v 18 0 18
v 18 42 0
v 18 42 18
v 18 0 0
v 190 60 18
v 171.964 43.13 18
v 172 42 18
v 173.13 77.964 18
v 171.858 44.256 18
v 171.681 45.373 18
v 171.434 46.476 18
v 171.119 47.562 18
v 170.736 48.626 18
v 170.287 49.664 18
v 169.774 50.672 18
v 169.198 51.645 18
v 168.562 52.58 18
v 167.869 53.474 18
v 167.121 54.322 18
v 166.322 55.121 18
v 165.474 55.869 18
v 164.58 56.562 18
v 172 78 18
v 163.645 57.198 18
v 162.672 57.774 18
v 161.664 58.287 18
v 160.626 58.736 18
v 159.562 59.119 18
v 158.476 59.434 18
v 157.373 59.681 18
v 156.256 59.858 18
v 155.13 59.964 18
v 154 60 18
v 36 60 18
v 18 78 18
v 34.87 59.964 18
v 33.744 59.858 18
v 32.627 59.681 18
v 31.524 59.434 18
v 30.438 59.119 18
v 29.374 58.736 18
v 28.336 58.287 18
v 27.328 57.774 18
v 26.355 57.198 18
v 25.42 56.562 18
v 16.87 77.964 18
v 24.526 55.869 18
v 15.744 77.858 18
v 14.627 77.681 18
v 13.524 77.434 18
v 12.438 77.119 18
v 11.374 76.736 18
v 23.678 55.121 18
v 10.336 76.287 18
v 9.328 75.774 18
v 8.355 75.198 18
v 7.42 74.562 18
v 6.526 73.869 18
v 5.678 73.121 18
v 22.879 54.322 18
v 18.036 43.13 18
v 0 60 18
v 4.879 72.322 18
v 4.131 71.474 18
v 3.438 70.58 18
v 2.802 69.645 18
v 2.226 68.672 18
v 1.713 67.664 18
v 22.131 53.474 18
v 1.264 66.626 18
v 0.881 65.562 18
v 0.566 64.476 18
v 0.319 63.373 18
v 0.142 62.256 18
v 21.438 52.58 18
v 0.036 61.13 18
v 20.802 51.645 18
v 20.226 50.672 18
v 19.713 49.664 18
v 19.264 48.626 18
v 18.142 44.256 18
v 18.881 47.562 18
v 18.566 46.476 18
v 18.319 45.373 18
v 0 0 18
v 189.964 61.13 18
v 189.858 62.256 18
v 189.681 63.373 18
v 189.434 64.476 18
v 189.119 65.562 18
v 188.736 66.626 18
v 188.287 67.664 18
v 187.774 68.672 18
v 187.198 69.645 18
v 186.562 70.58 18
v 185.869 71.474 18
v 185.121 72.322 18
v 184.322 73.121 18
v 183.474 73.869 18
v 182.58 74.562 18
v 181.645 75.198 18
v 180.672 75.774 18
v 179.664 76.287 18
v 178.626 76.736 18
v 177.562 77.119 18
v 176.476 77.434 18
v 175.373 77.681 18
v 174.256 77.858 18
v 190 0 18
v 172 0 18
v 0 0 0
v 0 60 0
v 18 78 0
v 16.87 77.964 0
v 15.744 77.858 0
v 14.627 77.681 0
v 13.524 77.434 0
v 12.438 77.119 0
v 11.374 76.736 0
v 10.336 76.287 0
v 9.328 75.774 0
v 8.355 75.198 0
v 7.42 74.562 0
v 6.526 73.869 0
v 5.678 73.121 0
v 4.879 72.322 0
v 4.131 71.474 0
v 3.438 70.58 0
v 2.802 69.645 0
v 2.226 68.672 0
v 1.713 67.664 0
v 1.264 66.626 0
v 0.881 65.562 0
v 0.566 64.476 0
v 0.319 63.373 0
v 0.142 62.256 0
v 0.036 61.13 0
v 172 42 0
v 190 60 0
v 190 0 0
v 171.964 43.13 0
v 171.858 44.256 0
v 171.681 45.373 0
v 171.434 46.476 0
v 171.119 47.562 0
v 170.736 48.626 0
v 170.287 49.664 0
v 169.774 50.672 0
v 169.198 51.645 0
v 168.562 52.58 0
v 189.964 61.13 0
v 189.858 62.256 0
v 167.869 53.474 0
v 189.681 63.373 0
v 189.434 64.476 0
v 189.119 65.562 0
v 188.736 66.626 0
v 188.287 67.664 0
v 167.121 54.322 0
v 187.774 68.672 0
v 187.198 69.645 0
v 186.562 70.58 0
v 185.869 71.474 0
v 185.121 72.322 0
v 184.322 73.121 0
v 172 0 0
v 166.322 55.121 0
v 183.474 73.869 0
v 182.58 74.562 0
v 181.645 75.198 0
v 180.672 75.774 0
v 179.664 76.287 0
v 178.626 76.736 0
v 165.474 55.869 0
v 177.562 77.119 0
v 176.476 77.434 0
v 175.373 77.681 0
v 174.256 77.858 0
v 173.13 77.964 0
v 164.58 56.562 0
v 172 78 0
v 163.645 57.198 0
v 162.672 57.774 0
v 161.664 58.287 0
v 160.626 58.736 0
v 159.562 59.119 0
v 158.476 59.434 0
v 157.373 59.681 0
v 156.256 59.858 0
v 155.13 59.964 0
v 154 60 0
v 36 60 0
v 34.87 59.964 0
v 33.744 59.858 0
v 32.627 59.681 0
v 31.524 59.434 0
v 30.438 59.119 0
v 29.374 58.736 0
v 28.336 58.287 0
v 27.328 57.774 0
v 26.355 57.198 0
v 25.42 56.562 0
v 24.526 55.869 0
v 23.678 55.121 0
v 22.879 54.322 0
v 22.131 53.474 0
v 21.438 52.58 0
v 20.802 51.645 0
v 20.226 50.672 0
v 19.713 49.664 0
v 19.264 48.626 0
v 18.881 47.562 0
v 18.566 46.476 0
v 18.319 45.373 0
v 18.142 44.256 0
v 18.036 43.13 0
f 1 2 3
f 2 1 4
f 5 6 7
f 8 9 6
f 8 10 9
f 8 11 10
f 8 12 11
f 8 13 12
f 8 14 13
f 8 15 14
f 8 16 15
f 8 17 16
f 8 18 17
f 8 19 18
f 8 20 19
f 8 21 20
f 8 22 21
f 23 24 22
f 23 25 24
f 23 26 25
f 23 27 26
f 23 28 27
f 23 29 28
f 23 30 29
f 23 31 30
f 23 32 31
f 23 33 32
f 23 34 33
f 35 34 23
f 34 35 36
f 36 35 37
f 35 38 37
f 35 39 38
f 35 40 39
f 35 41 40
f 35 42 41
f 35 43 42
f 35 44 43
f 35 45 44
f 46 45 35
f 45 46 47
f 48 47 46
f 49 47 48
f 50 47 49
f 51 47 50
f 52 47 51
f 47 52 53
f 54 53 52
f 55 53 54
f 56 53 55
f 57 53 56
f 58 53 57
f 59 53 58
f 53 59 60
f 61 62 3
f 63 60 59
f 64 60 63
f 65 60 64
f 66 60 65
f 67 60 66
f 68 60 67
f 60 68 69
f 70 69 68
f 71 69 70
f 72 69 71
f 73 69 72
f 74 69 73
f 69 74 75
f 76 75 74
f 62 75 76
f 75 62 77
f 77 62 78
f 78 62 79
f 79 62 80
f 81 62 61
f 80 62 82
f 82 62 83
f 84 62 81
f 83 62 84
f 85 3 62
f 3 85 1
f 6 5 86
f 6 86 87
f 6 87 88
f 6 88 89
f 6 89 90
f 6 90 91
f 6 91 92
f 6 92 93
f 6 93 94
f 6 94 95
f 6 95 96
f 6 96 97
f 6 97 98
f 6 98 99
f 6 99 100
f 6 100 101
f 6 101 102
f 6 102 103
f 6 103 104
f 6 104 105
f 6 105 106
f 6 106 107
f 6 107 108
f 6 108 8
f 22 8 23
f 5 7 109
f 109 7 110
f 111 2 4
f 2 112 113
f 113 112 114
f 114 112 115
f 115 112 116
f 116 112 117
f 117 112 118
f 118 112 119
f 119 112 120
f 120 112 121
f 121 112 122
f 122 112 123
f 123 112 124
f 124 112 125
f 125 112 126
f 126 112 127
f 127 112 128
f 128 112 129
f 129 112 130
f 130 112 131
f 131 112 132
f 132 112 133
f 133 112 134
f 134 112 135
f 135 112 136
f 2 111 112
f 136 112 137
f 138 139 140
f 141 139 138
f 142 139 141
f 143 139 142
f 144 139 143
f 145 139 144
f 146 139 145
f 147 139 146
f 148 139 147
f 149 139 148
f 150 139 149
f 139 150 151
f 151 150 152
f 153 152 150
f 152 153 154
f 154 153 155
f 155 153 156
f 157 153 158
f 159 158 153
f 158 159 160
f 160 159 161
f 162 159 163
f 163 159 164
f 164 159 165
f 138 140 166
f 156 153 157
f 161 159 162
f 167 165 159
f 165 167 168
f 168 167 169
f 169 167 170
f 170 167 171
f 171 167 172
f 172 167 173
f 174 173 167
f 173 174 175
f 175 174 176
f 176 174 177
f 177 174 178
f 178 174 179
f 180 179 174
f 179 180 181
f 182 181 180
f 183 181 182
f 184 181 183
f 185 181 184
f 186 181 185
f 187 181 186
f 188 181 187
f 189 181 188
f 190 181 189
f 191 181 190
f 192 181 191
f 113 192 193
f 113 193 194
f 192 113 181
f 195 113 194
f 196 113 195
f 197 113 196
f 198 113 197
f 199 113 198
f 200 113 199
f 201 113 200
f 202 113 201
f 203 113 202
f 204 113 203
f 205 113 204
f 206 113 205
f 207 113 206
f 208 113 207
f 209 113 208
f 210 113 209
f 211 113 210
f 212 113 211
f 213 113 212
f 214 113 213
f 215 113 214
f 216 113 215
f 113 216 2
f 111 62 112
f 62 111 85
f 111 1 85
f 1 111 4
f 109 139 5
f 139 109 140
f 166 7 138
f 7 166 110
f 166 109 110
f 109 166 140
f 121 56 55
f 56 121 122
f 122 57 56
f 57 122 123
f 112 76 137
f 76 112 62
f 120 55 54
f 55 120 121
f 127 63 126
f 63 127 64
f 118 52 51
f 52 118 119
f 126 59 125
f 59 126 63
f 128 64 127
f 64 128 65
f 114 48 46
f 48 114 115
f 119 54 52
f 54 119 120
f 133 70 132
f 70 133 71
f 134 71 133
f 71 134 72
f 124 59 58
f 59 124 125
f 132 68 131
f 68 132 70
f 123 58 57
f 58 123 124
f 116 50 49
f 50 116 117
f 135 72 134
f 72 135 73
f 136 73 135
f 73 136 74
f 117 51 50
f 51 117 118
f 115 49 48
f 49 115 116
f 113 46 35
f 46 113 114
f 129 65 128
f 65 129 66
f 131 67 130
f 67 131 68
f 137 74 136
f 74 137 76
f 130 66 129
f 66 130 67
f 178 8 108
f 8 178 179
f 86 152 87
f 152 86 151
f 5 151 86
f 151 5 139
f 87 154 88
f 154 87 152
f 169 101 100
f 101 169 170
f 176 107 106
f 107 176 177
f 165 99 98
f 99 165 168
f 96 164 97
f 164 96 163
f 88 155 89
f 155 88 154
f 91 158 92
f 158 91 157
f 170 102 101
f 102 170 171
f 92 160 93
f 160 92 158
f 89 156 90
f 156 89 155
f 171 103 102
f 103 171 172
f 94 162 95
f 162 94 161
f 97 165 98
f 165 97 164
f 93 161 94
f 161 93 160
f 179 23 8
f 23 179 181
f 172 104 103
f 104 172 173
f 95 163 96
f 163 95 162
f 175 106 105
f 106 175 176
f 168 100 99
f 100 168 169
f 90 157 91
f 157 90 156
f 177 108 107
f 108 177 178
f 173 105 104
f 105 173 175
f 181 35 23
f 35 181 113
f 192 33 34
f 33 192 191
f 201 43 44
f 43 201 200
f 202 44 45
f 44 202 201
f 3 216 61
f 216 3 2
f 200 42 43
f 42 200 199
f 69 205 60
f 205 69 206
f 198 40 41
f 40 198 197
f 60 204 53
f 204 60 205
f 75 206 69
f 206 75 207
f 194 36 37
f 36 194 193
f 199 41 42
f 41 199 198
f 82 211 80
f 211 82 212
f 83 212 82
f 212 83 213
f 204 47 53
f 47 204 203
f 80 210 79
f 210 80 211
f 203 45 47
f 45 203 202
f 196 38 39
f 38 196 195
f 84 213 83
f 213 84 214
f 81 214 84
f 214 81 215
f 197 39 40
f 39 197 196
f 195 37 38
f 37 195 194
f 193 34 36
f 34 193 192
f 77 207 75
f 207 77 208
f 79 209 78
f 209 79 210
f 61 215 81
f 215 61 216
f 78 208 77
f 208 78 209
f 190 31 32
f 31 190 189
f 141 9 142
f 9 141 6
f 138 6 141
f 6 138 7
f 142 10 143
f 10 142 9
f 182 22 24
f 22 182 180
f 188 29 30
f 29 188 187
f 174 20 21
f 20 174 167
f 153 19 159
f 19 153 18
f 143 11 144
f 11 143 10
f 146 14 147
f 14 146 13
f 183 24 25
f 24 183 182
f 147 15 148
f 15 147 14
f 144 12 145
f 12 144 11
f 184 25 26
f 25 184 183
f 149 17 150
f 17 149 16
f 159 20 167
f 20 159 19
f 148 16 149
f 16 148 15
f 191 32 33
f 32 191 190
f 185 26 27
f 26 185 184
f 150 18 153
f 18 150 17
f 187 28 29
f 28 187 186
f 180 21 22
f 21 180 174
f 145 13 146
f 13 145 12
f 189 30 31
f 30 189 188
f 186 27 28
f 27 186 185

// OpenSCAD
span=172;
dia=18;
$fn=100;

module _handle()
{
  difference()
  {
    union()
    {
      // side blocks
      for(dx=[0, span])
        translate(dx*[1,0,0])
          cube([dia, 60, dia]);
      // top holder
      translate([dia, 60, 0])
        cube([span-dia, dia, dia]);
      // rounded edges
      for(dx=[0, span-dia])
        translate([dia+dx, 60,0])
          cylinder(r=dia, h=dia);
    }
    for(dx=[0, span-3*dia])
      translate([2*dia+dx, 60-dia, -1])
        cylinder(r=dia, h=dia+2);
  }
}

_handle();
